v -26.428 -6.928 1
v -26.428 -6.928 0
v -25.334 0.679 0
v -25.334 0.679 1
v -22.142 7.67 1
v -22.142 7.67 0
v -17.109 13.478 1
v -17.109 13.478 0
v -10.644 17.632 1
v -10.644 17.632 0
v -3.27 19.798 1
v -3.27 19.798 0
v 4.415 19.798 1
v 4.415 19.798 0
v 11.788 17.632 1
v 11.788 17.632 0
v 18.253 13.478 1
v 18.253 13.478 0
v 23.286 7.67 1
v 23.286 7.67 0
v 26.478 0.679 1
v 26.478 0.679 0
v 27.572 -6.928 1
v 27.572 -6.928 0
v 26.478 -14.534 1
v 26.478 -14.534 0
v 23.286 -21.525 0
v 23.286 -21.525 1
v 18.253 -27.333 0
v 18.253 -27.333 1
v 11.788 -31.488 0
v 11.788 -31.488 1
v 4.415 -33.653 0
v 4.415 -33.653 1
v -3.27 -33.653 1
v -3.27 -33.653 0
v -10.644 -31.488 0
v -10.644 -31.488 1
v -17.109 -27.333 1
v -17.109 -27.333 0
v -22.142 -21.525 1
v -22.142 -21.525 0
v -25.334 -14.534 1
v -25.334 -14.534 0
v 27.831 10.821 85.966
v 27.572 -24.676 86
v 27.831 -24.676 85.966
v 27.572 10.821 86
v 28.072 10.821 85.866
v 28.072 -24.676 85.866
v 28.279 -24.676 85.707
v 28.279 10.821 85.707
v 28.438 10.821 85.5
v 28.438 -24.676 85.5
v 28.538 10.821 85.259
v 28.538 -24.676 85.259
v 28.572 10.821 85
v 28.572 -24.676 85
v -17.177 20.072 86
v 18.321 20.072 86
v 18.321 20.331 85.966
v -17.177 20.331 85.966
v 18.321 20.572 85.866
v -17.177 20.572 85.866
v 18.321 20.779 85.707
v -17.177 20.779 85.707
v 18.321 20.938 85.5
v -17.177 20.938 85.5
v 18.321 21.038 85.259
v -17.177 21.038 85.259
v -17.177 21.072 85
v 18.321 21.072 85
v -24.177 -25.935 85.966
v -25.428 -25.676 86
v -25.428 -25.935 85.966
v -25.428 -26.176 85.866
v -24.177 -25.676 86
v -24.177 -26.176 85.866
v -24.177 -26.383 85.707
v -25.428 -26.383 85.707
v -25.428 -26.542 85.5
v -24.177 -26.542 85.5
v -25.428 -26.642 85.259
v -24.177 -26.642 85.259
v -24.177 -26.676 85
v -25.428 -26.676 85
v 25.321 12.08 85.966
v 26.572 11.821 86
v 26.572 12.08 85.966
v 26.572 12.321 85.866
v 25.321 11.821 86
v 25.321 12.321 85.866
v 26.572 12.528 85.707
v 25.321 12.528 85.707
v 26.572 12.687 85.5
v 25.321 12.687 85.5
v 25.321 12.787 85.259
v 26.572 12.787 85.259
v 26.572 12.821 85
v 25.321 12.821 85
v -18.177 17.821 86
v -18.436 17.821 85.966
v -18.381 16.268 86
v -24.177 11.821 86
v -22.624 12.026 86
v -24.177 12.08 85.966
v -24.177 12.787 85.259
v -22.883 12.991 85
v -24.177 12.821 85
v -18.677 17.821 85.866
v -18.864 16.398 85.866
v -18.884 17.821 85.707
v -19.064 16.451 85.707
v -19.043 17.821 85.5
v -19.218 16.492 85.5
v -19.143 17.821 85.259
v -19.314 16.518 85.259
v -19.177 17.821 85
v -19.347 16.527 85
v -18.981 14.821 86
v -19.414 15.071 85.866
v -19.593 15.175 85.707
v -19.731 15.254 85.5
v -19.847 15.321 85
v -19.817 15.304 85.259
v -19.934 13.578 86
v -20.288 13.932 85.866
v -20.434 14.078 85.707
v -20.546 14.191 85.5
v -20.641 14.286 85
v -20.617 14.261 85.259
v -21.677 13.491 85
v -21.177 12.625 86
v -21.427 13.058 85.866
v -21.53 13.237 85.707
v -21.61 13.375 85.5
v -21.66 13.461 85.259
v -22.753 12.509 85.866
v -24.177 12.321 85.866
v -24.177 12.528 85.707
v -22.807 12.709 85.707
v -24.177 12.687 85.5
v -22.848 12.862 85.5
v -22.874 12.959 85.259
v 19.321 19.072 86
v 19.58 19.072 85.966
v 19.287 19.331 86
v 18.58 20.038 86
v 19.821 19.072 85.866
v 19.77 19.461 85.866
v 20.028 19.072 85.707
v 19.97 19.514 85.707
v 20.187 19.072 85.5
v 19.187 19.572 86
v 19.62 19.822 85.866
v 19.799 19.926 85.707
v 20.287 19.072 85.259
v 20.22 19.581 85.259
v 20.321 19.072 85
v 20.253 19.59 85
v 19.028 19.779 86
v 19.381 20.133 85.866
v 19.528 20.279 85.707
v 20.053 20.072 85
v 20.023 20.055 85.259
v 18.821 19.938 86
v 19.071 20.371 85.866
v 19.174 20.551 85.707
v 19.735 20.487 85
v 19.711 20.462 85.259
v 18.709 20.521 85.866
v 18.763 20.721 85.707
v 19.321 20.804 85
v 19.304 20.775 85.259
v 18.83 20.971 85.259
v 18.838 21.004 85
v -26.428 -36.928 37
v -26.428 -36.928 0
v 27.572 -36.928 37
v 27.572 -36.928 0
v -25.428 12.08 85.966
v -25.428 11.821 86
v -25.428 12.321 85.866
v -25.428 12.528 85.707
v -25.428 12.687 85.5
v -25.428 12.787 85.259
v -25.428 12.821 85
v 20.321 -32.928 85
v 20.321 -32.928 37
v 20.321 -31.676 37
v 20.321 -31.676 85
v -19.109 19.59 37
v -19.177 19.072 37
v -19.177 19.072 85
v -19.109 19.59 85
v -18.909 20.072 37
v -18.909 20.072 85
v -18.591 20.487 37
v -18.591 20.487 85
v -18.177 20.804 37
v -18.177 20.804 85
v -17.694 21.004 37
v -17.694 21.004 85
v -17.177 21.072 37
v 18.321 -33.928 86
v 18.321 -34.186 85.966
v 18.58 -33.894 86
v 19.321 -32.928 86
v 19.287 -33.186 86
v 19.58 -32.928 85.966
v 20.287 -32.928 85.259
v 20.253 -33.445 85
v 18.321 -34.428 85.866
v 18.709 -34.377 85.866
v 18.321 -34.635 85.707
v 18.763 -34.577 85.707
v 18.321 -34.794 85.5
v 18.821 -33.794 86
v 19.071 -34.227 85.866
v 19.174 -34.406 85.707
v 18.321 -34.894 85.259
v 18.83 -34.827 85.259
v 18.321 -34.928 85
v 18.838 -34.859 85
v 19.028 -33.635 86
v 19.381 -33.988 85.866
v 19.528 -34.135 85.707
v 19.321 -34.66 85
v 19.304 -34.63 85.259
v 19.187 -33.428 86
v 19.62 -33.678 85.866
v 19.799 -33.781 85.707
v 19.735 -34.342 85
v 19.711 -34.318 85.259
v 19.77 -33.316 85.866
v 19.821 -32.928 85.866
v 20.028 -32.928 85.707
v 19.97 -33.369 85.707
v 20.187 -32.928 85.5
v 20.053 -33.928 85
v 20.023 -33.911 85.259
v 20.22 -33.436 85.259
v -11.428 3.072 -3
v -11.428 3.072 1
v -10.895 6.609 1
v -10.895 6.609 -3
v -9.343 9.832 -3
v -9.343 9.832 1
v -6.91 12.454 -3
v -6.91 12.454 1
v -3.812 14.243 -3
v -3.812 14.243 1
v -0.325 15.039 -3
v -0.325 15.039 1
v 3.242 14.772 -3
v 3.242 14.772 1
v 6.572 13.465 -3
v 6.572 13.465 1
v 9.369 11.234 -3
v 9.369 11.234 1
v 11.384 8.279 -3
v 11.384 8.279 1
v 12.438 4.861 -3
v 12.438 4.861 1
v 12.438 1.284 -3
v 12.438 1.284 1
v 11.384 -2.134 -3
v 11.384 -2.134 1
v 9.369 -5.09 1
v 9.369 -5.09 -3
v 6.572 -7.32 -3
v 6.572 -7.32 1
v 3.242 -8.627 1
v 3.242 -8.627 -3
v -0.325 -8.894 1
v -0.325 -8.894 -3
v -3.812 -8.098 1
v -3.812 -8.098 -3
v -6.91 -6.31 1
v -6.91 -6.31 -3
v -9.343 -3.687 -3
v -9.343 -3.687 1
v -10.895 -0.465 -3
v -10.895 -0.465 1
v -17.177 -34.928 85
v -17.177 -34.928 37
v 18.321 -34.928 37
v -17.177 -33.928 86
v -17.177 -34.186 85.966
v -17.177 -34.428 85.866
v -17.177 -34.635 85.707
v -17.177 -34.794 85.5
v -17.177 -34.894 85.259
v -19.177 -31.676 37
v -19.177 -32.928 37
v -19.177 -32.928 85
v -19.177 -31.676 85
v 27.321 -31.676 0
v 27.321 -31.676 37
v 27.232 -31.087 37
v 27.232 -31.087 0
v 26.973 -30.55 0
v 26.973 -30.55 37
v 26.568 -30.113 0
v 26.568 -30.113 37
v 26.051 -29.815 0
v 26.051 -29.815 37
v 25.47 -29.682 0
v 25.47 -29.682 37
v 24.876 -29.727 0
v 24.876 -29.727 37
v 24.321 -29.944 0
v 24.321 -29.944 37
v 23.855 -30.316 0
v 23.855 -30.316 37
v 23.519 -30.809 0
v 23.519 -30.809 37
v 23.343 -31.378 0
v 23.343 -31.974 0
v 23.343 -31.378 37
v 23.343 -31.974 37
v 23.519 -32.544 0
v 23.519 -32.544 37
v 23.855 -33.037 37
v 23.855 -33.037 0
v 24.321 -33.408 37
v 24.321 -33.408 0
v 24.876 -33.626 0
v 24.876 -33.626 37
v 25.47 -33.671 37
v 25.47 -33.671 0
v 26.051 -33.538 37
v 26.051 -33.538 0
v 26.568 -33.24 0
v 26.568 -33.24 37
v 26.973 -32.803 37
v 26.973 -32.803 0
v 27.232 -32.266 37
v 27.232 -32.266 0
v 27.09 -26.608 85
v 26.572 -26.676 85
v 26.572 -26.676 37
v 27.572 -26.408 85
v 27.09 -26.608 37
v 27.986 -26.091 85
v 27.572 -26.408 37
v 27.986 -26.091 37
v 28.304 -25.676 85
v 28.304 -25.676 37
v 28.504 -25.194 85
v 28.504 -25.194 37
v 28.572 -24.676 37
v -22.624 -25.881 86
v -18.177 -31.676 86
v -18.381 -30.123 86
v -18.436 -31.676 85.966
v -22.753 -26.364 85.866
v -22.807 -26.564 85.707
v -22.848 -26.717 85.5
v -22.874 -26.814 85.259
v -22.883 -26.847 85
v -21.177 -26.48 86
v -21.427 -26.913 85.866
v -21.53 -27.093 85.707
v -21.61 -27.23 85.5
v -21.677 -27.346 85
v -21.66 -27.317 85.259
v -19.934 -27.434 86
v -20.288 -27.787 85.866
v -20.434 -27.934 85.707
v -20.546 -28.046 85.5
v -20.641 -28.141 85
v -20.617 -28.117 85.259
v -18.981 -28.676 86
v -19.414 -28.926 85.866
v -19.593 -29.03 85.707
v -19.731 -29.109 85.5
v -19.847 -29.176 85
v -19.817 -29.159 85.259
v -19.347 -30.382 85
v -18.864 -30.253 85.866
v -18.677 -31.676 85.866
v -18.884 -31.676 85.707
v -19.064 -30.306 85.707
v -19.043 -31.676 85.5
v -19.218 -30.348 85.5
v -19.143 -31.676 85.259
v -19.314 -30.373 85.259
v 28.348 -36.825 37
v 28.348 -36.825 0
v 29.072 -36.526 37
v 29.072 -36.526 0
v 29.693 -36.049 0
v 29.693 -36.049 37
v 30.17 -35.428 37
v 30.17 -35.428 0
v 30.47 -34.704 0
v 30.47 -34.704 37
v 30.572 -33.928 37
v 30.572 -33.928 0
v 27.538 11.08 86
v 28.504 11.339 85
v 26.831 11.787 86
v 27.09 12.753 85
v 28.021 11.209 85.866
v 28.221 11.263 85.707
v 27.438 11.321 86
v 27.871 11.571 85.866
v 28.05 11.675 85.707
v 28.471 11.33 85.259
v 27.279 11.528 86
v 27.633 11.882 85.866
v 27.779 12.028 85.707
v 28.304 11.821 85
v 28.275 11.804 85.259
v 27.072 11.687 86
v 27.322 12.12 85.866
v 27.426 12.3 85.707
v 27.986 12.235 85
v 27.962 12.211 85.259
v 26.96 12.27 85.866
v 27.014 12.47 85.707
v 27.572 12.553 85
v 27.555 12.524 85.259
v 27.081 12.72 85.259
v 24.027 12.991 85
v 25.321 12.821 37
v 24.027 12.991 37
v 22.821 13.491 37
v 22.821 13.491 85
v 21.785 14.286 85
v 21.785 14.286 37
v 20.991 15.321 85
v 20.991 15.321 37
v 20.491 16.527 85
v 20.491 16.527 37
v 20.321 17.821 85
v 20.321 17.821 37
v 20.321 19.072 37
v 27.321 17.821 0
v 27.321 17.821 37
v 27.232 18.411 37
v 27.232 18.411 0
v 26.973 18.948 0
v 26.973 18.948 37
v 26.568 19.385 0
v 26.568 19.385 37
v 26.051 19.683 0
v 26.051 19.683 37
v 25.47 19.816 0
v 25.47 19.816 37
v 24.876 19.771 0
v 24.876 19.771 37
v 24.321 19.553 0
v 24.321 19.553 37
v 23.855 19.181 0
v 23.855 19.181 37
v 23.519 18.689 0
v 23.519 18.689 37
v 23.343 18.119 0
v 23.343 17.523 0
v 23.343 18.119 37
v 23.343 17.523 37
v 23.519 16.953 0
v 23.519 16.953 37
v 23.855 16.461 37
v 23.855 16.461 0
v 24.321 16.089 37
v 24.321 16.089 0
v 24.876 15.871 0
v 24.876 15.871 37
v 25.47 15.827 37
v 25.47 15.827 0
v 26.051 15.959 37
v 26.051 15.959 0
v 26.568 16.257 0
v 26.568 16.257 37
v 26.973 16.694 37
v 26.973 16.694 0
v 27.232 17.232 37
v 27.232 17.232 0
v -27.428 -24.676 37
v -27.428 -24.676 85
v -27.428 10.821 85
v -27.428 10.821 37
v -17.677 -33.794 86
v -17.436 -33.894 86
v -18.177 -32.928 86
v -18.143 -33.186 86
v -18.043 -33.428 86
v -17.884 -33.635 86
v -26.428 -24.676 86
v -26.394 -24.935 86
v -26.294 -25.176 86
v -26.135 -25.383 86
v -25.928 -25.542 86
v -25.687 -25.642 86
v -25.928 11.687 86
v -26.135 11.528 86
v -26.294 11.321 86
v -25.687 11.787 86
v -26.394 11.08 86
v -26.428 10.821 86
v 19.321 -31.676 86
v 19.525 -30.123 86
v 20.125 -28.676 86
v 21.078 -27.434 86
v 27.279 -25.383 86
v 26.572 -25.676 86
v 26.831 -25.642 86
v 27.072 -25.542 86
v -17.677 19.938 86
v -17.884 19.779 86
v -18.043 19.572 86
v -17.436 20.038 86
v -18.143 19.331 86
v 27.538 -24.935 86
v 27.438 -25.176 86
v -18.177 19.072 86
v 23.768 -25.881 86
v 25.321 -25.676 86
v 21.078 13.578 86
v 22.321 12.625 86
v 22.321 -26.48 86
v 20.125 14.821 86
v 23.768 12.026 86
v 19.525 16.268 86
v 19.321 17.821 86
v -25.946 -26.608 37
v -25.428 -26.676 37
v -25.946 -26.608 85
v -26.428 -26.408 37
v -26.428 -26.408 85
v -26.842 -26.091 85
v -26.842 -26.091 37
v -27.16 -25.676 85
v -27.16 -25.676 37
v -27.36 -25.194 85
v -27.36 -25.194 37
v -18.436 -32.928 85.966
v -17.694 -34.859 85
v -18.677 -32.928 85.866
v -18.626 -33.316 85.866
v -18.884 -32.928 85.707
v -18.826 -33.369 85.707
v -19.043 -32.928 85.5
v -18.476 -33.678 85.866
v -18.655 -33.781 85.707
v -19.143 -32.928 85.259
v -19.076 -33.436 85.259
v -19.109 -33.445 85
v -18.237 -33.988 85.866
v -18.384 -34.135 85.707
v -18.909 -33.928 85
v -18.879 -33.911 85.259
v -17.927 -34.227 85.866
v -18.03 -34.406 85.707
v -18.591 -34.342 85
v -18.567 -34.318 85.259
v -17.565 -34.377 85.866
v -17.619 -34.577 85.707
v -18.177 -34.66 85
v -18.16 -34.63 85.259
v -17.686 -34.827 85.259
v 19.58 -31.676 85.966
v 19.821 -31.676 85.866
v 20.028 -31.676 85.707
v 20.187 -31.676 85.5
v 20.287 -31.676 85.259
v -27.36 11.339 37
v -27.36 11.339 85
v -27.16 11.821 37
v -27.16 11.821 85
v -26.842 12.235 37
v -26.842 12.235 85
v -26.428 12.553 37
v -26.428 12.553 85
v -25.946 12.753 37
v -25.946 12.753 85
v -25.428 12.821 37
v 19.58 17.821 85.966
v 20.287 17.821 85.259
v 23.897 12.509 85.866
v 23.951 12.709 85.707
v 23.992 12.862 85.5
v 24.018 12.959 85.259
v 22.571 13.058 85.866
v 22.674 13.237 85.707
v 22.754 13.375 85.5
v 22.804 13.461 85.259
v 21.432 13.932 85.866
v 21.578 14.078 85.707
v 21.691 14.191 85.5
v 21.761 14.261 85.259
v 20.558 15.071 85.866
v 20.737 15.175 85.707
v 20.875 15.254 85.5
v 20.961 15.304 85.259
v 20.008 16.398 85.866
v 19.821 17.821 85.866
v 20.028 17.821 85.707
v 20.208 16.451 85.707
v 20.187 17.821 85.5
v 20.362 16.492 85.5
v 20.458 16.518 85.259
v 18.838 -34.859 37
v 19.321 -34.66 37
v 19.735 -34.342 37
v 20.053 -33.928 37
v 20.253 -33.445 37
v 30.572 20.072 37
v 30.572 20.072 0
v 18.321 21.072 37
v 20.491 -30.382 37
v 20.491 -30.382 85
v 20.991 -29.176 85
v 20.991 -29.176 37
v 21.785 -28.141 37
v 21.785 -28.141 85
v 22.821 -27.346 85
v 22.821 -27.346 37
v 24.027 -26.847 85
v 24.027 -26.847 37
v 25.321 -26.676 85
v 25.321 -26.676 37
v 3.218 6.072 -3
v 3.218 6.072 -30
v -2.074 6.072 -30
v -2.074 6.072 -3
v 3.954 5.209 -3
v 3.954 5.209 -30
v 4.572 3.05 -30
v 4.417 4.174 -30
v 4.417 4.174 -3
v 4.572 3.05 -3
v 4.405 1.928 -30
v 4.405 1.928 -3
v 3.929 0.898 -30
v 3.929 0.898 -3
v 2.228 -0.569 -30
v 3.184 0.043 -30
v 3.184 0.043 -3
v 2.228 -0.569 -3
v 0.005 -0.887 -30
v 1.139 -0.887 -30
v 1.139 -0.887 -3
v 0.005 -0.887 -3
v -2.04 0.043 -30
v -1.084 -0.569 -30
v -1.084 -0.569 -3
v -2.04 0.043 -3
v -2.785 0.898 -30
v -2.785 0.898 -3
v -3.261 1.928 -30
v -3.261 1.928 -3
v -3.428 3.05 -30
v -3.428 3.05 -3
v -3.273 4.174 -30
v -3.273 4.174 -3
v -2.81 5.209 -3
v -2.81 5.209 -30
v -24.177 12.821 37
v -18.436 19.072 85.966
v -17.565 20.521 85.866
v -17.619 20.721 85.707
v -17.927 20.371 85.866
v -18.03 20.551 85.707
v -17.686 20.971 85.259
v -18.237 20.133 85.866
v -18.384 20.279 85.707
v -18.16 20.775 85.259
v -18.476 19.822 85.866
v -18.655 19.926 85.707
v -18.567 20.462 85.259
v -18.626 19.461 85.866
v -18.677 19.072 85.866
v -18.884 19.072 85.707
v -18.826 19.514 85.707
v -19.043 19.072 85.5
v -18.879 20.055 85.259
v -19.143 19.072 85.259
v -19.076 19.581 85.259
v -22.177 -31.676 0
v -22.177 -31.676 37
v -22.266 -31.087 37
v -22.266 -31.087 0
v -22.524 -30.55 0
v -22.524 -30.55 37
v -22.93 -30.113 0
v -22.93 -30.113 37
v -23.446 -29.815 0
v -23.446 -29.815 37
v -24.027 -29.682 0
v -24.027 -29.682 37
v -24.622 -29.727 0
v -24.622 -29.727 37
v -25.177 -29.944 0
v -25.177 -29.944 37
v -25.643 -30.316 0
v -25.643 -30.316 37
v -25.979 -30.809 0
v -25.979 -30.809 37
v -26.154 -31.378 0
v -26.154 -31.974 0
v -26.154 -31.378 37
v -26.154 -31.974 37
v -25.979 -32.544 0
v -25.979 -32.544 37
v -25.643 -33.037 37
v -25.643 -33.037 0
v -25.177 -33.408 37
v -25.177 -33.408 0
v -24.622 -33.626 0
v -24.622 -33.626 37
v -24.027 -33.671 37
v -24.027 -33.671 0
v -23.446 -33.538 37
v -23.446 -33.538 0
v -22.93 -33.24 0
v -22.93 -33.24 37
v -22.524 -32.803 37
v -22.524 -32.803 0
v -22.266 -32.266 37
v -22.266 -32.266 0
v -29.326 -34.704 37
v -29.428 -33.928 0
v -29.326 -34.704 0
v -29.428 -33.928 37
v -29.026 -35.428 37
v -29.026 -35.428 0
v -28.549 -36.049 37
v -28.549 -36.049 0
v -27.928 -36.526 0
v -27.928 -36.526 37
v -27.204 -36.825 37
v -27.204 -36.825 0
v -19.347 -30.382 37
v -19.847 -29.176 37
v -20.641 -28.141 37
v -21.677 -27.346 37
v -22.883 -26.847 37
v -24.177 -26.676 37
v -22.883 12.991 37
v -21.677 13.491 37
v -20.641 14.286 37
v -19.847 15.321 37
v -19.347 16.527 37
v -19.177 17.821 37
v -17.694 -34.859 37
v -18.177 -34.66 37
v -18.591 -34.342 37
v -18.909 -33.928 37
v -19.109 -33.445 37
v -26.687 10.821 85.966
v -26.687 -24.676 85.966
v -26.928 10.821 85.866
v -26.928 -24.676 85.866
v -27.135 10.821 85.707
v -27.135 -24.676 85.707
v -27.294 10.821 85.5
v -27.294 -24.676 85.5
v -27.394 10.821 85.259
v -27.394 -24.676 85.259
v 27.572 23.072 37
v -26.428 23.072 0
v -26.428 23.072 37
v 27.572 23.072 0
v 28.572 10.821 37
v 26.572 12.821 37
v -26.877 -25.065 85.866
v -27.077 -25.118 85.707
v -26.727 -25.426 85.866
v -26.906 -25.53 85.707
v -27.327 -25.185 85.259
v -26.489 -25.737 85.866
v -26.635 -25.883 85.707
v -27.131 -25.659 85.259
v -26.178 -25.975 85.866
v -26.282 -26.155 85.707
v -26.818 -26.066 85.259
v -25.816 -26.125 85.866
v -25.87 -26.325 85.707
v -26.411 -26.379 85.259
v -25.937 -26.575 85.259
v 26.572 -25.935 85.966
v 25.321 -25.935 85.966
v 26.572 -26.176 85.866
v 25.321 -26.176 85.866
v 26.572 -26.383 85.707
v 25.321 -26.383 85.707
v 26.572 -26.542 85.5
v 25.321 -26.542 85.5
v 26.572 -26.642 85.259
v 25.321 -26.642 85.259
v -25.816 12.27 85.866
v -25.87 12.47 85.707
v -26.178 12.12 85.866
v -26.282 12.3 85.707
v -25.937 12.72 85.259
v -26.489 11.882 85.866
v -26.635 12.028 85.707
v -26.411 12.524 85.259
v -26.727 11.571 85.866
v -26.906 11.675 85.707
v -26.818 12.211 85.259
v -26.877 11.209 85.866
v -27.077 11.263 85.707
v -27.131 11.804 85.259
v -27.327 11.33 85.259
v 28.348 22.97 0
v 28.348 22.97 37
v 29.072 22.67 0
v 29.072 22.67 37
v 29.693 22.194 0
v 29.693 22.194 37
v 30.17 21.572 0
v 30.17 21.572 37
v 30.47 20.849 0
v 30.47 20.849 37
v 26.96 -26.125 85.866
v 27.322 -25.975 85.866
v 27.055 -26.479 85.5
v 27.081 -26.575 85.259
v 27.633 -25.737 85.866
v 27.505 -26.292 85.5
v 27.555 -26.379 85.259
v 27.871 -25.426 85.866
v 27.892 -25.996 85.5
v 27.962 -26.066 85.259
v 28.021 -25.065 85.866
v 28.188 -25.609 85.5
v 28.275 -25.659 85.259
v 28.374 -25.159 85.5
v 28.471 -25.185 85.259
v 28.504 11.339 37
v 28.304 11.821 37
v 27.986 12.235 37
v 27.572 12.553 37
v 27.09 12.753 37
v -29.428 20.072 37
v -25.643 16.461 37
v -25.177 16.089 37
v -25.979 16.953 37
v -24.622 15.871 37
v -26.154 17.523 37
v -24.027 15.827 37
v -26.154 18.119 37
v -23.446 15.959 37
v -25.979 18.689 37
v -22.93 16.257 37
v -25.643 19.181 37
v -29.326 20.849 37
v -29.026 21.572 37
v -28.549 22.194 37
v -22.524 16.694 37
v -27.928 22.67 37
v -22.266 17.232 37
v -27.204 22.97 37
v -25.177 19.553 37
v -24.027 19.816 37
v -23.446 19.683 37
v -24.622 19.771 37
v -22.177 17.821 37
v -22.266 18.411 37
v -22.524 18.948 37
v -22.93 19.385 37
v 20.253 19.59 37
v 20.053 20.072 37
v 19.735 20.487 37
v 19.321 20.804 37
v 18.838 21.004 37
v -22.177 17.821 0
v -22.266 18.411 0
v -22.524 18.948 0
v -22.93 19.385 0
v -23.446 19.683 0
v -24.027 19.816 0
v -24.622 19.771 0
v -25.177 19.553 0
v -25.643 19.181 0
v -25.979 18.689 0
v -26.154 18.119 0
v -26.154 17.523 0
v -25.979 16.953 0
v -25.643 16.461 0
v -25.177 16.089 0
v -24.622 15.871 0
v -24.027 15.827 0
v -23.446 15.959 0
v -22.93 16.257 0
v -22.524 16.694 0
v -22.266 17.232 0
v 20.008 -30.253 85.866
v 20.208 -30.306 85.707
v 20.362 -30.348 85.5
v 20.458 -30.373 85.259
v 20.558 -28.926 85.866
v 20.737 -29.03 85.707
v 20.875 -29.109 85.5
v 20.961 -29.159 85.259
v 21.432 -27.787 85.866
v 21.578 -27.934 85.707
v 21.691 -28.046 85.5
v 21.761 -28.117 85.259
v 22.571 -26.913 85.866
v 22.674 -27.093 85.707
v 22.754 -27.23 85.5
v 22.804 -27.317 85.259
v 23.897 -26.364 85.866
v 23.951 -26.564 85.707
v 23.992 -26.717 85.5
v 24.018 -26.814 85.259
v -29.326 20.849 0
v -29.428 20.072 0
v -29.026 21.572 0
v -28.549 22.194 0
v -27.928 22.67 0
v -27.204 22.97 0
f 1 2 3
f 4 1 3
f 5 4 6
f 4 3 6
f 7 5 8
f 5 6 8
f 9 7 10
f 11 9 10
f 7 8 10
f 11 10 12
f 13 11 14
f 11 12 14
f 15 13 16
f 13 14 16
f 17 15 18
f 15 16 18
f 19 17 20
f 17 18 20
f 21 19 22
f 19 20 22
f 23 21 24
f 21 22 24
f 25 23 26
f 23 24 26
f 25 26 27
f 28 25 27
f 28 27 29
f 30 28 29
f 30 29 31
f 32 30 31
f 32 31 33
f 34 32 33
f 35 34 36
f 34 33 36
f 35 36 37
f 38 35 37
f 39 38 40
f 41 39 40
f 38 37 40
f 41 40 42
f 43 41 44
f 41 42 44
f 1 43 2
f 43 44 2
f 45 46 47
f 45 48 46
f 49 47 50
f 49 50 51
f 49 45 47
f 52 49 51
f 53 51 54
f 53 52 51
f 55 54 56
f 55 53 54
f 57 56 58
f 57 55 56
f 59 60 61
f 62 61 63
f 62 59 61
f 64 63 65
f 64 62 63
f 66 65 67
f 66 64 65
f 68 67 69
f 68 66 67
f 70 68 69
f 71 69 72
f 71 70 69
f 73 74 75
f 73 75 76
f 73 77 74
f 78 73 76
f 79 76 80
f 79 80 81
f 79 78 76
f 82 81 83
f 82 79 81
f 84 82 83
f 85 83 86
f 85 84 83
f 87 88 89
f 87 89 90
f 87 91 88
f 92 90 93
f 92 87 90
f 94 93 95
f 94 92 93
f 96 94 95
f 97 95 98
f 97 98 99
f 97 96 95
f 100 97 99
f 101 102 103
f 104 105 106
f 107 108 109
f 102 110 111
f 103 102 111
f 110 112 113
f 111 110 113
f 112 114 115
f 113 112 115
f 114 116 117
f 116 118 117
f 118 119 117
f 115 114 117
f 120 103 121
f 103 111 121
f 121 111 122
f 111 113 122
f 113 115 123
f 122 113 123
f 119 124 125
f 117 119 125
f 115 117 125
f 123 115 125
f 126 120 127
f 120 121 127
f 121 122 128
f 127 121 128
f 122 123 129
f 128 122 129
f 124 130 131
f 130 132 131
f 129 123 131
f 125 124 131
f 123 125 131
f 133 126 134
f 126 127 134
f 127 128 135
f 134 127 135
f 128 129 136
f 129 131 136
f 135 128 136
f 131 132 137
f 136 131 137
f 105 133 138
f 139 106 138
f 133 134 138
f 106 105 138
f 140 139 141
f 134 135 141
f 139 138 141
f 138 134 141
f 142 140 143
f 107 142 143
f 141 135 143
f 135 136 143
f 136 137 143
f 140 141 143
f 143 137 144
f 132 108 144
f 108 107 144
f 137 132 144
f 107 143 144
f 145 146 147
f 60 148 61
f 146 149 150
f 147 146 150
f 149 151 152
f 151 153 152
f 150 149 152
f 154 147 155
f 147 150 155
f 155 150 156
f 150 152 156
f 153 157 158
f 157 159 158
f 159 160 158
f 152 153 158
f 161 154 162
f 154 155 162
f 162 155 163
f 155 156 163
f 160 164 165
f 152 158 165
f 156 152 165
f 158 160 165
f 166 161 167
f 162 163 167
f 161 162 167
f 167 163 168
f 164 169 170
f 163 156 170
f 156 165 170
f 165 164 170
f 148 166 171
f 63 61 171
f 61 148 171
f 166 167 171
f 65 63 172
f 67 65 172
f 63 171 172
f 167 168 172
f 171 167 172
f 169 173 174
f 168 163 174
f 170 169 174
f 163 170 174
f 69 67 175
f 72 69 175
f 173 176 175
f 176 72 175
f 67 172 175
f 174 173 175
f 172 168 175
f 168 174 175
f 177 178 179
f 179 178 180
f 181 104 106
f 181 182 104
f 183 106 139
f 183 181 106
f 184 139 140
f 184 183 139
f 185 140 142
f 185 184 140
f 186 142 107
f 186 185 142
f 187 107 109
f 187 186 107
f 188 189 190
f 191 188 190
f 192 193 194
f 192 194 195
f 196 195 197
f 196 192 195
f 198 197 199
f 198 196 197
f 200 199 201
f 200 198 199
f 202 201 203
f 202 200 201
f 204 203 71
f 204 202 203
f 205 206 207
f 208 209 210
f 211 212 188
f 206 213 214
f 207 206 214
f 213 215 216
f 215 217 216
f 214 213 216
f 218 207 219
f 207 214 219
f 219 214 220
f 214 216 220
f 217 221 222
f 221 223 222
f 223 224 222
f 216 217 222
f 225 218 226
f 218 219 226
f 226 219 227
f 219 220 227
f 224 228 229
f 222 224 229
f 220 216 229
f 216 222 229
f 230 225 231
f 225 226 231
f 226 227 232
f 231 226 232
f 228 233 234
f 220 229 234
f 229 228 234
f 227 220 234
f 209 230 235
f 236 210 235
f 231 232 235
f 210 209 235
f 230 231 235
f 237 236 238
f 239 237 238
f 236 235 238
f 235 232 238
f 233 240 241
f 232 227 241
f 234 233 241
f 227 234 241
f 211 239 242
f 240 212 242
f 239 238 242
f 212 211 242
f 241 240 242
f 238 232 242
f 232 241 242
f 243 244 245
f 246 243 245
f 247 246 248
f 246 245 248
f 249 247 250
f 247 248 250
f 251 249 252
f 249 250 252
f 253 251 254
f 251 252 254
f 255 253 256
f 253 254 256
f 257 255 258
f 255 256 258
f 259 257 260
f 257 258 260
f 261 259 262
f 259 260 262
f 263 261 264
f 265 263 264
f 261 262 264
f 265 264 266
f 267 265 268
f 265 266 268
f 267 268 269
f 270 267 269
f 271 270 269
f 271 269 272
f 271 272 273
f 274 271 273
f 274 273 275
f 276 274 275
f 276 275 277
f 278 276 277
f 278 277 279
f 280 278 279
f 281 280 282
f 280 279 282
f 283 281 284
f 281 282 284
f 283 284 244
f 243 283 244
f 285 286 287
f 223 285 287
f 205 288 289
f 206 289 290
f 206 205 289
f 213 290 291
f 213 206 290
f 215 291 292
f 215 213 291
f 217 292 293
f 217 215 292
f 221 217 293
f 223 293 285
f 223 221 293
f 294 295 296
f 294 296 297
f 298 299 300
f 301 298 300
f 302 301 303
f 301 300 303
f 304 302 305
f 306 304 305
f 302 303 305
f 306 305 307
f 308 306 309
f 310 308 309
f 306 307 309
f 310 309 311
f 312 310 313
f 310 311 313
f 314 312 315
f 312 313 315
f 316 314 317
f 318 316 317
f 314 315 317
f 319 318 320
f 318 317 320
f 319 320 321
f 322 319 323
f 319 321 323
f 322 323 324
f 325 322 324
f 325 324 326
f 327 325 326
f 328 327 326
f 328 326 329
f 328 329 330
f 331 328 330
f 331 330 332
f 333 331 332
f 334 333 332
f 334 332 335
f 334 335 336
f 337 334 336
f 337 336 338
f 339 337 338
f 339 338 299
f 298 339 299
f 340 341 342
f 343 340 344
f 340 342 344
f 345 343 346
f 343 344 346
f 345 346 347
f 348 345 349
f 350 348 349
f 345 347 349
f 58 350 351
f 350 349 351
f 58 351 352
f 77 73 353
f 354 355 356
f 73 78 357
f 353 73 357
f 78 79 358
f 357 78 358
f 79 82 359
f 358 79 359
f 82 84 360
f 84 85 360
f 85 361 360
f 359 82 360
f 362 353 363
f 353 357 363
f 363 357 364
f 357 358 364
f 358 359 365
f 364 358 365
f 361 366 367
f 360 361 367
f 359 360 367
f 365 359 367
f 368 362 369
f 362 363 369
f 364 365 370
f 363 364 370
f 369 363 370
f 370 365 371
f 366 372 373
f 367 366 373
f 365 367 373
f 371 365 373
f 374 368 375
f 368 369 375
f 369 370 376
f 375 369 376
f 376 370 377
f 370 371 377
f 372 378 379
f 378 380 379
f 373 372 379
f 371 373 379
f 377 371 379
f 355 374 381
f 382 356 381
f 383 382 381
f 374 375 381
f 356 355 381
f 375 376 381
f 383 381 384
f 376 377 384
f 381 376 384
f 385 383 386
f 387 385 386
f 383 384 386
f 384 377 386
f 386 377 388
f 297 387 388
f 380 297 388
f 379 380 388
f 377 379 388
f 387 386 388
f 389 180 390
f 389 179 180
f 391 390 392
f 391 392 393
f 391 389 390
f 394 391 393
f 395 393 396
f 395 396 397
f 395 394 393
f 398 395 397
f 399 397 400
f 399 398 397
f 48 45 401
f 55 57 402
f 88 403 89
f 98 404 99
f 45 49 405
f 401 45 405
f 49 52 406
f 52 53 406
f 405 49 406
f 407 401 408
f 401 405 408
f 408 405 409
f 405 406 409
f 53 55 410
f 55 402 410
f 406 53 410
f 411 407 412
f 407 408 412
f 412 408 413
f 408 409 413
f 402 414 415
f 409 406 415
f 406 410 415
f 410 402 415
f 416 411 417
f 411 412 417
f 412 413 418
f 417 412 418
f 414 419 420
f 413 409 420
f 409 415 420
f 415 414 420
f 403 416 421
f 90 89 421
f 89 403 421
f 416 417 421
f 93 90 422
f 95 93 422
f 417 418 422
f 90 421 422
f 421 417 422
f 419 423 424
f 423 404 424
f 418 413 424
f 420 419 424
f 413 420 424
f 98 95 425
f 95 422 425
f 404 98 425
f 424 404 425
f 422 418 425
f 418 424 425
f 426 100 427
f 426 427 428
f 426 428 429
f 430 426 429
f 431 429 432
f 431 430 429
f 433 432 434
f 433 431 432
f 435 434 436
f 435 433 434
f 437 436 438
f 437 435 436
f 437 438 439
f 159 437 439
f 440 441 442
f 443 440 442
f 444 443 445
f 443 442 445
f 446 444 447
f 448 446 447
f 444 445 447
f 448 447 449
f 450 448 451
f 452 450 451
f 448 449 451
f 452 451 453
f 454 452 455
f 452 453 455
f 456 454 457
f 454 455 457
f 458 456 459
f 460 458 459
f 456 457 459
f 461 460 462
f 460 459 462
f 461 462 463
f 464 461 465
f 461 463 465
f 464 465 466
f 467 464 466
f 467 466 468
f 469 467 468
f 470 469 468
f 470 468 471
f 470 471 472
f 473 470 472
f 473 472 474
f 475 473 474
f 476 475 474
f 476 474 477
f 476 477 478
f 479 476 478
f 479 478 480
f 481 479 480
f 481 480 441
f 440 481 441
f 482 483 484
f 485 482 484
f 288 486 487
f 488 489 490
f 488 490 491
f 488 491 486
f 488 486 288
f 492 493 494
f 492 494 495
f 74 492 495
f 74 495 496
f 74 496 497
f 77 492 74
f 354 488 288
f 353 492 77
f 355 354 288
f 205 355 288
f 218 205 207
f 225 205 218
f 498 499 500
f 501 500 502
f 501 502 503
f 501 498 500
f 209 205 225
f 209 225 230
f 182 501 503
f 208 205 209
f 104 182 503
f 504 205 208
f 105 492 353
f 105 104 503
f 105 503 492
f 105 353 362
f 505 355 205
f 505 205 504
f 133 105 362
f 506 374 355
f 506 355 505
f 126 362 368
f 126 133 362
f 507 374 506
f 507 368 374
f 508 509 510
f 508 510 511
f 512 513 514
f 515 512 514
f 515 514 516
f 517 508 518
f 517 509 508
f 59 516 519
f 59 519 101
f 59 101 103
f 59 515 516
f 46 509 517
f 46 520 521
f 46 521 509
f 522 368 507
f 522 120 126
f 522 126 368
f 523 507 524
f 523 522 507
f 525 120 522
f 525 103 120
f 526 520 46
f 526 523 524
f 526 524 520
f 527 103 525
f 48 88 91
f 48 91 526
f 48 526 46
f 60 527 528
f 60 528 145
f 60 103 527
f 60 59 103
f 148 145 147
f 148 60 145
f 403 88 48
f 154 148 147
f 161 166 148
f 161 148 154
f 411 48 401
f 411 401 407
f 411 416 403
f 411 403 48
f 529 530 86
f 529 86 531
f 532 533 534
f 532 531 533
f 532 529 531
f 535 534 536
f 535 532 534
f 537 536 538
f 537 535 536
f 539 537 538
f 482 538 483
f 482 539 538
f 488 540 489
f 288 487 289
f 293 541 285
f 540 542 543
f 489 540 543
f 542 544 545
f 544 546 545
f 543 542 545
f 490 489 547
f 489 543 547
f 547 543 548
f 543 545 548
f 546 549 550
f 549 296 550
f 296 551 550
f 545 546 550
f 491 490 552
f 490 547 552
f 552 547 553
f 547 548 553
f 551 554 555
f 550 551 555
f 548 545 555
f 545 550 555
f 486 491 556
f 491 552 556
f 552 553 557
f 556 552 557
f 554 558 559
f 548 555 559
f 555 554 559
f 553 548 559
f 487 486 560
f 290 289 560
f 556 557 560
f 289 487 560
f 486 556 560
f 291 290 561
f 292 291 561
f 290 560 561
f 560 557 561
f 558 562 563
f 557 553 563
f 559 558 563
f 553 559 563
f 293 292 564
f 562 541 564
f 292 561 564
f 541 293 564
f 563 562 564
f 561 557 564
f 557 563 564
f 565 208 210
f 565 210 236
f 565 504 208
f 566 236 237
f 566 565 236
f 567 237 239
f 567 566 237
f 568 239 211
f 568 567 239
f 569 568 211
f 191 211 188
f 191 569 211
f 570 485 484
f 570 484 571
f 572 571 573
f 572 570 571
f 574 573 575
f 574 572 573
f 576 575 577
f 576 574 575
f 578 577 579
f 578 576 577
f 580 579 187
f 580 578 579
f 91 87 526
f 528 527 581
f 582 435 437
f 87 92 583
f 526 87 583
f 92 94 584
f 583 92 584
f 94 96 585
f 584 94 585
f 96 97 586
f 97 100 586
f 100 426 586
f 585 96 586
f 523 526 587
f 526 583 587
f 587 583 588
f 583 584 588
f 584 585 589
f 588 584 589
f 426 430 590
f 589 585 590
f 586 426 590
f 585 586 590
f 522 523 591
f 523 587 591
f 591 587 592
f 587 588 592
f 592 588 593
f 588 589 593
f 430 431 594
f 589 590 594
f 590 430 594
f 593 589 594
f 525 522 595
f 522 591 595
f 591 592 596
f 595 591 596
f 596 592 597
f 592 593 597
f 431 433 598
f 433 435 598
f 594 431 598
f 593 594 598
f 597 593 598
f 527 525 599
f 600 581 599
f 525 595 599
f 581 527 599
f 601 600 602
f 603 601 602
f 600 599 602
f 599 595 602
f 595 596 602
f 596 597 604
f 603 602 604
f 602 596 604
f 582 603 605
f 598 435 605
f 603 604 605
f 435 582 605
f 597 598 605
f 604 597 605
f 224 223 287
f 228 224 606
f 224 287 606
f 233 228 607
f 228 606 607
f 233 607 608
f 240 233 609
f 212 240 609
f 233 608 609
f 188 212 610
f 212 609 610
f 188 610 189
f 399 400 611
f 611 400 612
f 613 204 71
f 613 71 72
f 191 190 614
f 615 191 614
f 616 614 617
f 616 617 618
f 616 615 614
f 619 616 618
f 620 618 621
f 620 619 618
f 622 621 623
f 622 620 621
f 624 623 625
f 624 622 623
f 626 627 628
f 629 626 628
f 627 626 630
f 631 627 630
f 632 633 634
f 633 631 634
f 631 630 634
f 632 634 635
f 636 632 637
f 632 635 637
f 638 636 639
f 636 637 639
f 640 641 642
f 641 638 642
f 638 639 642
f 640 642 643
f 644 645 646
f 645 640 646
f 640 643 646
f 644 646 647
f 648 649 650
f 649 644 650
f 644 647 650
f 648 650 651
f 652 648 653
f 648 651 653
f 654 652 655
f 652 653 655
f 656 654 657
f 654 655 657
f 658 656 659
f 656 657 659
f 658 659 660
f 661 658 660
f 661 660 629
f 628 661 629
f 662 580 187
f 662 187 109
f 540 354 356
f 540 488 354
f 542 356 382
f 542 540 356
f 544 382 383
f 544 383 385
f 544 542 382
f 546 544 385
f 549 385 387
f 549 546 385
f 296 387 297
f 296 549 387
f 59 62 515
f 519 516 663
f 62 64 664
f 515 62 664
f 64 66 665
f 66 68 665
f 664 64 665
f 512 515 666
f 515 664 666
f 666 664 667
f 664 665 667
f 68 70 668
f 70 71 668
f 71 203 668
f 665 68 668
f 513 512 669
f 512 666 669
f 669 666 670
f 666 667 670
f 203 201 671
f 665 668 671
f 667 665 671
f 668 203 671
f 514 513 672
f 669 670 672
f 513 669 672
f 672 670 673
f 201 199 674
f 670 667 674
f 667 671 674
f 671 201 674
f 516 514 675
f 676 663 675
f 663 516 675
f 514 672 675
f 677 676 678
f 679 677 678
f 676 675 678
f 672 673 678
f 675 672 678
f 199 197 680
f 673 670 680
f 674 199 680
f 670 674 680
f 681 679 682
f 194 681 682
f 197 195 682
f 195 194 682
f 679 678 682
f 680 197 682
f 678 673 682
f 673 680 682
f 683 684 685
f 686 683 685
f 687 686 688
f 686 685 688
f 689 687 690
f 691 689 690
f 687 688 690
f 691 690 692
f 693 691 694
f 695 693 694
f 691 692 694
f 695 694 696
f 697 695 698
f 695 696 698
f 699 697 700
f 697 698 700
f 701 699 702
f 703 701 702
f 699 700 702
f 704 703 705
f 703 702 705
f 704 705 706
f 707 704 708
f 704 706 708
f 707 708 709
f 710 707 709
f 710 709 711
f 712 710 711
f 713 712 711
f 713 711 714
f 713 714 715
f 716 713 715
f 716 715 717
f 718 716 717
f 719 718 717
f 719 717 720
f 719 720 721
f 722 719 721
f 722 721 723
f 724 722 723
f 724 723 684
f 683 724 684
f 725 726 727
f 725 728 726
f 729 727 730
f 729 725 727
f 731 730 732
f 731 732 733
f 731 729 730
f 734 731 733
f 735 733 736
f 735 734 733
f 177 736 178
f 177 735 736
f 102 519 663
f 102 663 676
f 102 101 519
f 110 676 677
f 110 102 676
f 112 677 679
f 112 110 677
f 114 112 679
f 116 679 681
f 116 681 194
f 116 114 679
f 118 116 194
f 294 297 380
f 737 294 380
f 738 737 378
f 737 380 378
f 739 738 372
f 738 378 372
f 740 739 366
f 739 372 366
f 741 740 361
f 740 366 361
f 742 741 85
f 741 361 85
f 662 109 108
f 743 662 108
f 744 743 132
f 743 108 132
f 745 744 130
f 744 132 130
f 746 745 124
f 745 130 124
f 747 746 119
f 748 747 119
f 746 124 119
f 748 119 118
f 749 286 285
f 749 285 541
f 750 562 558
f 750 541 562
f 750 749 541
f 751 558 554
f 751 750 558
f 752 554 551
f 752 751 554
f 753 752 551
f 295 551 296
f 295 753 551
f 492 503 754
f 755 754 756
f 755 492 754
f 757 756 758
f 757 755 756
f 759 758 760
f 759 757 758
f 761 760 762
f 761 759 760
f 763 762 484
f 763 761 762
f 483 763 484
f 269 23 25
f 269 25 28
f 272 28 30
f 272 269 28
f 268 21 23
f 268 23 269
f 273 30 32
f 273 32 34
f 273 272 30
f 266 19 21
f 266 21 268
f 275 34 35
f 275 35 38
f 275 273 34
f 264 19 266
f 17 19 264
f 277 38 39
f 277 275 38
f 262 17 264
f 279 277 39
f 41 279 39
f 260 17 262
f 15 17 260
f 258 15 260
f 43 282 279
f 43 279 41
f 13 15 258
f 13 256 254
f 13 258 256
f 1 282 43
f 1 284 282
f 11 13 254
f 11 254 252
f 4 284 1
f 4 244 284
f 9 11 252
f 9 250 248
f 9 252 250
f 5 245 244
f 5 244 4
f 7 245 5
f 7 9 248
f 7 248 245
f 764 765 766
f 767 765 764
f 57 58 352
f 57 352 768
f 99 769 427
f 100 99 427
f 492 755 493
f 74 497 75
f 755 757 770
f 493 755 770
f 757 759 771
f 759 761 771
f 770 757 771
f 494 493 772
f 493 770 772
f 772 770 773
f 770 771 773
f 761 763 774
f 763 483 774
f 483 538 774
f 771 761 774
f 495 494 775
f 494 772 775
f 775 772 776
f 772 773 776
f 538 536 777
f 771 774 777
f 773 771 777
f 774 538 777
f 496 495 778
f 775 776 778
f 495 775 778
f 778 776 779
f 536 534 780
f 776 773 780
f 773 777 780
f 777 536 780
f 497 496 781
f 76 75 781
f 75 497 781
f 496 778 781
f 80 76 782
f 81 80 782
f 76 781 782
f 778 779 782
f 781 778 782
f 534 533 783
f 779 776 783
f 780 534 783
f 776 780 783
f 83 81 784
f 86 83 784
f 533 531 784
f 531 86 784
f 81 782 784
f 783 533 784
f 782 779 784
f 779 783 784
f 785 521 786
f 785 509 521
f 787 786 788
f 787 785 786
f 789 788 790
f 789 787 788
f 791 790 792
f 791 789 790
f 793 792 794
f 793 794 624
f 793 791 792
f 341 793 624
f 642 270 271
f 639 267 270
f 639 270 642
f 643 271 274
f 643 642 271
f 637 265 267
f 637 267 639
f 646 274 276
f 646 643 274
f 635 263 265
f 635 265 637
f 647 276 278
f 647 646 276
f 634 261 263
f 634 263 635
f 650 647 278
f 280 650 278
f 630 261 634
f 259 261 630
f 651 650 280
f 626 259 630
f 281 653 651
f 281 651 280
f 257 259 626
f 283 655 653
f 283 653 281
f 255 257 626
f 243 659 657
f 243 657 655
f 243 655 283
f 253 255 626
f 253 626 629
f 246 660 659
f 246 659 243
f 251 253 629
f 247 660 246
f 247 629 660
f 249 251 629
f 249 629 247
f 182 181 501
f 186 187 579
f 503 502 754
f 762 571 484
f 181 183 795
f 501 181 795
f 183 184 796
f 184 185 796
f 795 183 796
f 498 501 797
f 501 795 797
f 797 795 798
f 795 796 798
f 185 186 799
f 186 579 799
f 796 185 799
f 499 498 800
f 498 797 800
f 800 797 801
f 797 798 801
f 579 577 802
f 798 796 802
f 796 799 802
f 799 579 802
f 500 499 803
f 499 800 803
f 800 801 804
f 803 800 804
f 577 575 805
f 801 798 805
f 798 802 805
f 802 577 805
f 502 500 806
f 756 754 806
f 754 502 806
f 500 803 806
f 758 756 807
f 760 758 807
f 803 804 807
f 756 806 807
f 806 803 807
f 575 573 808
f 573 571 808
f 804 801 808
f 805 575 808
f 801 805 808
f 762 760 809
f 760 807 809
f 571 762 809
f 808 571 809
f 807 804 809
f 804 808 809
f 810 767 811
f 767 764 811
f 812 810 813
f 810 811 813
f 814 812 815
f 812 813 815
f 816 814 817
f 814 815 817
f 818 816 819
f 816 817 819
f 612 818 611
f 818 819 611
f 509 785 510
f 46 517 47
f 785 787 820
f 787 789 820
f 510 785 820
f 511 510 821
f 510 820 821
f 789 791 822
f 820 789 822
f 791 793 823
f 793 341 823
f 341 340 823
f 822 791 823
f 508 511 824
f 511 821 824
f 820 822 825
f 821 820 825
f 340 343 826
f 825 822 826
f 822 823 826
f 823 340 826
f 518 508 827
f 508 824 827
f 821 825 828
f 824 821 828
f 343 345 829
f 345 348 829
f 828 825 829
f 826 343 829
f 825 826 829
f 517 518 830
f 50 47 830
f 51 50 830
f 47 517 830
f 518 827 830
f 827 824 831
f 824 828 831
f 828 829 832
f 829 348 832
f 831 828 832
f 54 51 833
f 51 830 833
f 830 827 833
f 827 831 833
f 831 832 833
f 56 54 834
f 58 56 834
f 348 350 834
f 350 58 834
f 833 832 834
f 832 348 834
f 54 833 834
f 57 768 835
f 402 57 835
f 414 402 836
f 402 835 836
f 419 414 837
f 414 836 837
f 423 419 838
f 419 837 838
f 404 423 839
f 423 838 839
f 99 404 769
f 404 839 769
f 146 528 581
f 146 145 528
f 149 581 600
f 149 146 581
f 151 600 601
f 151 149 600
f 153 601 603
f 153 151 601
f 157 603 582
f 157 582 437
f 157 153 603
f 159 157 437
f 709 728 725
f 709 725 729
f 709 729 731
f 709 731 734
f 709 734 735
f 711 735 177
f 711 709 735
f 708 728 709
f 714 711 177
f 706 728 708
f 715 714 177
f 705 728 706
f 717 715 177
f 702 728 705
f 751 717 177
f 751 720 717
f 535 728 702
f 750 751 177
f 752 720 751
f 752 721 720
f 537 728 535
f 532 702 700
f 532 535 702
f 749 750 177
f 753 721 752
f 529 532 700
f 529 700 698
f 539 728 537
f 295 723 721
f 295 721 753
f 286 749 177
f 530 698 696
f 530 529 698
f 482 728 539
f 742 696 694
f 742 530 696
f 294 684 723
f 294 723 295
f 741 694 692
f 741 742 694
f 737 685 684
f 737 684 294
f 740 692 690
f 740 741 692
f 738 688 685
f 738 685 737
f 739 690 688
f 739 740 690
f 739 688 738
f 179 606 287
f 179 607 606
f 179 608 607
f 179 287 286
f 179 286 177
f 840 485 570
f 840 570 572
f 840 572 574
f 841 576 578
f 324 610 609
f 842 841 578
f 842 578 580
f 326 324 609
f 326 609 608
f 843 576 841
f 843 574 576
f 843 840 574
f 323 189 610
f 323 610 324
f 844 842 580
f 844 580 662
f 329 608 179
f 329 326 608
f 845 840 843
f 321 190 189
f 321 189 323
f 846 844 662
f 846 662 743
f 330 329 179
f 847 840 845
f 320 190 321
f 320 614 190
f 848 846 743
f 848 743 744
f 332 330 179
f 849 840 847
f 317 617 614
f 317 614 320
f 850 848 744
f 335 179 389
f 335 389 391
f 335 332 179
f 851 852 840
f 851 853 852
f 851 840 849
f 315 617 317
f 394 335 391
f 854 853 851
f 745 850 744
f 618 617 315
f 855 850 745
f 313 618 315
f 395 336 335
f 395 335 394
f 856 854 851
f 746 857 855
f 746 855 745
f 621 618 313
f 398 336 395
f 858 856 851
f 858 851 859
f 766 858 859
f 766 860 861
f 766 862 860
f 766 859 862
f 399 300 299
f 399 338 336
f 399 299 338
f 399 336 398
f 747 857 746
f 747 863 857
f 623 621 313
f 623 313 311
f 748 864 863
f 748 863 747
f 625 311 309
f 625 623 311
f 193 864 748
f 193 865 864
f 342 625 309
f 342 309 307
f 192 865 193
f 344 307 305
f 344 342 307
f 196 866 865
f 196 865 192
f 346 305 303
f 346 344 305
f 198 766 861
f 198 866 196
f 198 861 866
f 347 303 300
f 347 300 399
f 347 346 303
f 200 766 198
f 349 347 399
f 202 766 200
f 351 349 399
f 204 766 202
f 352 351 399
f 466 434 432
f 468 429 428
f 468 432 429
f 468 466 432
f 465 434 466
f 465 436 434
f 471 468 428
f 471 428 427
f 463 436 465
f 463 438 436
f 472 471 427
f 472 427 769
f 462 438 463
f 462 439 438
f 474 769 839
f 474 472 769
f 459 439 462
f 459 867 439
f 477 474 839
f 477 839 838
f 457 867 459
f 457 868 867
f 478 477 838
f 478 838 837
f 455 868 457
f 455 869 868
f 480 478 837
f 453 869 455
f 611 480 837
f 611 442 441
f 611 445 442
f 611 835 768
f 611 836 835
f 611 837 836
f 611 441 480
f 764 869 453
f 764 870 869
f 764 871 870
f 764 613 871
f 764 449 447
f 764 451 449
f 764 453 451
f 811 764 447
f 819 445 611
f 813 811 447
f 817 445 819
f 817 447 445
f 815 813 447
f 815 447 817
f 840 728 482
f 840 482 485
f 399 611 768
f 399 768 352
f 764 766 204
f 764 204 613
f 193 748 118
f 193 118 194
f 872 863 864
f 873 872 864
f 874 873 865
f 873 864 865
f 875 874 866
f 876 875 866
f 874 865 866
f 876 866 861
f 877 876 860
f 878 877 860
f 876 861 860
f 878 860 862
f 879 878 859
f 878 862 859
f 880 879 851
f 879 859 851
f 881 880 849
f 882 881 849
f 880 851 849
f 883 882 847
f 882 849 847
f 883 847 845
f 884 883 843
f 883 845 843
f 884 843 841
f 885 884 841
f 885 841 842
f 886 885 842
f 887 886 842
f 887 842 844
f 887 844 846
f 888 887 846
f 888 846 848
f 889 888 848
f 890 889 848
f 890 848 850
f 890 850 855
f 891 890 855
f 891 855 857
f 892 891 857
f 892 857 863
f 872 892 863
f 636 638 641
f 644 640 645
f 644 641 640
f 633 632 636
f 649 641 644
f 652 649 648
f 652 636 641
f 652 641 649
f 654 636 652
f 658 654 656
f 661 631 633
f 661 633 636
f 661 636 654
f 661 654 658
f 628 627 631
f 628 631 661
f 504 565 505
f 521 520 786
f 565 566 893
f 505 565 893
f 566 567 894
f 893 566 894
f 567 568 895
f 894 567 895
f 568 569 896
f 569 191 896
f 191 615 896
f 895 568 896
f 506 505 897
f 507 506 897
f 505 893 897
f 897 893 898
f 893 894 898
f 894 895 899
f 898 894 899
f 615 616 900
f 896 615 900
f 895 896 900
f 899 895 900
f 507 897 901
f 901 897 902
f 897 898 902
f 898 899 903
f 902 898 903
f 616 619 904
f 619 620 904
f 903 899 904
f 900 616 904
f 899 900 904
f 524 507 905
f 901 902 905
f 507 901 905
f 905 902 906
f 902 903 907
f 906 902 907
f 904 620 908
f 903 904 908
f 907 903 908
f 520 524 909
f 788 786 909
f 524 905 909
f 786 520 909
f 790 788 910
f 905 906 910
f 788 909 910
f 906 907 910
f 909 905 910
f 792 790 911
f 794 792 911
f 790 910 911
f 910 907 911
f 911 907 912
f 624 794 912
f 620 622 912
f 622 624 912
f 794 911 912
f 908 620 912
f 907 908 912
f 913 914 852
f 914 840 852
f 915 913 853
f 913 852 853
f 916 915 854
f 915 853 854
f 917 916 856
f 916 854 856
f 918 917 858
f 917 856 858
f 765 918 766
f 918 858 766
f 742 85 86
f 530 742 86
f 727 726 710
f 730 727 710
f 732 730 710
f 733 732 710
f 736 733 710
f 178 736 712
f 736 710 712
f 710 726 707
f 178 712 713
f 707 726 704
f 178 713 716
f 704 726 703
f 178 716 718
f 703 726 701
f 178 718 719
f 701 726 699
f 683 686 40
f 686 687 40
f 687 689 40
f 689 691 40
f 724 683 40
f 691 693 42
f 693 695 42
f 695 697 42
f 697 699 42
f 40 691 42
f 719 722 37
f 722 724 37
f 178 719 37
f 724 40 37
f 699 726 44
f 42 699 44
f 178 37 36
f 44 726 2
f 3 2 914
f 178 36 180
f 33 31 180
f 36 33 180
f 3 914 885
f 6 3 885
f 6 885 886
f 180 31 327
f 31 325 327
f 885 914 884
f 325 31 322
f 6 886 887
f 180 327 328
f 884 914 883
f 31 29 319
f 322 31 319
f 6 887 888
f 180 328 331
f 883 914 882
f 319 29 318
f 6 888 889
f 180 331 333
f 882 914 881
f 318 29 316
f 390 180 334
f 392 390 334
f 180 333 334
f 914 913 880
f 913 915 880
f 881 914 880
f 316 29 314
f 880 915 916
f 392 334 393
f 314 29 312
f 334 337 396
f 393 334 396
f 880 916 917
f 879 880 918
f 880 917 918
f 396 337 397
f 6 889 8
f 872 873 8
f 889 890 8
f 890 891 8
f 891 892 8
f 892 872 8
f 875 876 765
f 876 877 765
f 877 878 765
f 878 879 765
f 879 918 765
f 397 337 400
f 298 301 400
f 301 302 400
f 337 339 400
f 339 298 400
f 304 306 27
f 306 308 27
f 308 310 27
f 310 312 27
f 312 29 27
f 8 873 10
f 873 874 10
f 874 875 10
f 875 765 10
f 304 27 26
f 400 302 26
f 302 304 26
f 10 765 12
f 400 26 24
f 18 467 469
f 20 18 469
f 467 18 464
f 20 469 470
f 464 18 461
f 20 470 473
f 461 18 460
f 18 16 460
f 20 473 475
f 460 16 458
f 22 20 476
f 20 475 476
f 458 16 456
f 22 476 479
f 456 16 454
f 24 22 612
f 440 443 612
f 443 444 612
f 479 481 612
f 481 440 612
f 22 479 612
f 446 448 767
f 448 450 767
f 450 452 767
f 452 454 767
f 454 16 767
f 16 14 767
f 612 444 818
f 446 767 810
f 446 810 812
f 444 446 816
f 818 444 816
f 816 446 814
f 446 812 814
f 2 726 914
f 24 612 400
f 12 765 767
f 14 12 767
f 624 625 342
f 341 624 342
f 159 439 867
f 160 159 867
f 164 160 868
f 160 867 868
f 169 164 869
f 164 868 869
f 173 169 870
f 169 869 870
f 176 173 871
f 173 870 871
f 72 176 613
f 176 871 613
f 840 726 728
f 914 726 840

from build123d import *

# Parameters (mm, degrees)
SKETCH_1_W          = 60
SKETCH_1_H          = 60
EXTRUDE_1_DEPTH     = 37
SKETCH_2_W          = 56
SKETCH_2_H          = 56
EXTRUDE_2_DEPTH     = 49
CUT_EXTRUDE_1_DEPTH = 49
SKETCH_4_R          = 2
CUT_EXTRUDE_2_DEPTH = 49
FILLET_1_R          = 2
SKETCH_5_R          = 27
CUT_EXTRUDE_3_DEPTH = 1
SKETCH_6_R          = 12
EXTRUDE_3_DEPTH     = 4
SKETCH_7_R          = 4
EXTRUDE_4_DEPTH     = 27
SKETCH_8_W          = 5.291502622
SKETCH_8_H          = 3.956308335
CUT_EXTRUDE_4_DEPTH = 27
FILLET_2_R          = 1
FILLET_3_R          = 3


with BuildPart() as part:
    # Эскиз1 → Бобышка-Вытянуть1 (new body)
    with BuildSketch(Plane.XY):
        with Locations((0.572032188, -6.927630122)):
            Rectangle(SKETCH_1_W, SKETCH_1_H)
    extrude(amount=EXTRUDE_1_DEPTH)

    # Эскиз2 → Бобышка-Вытянуть2 (add)
    with BuildSketch(Plane.XY.offset(37)):
        with Locations((0.572032188, -6.927630122)):
            Rectangle(SKETCH_2_W, SKETCH_2_H)
    extrude(amount=EXTRUDE_2_DEPTH)

    # Эскиз3 → Вырез-Вытянуть1 (cut)
    with BuildSketch(Plane.XY.offset(86)):
        with BuildLine():
            Line((-19.176705154, 17.82110722), (-19.176705154, 21.072369878))
            Line((-19.176705154, 21.072369878), (-27.427967812, 21.072369878))
            Line((-27.427967812, 21.072369878), (-27.427967812, 12.82110722))
            Line((-27.427967812, 12.82110722), (-24.176705154, 12.82110722))
            ThreePointArc((-24.176705154, 12.82110722), (-20.641171248, 14.285573314), (-19.176705154, 17.82110722))
        make_face()
        with BuildLine():
            Line((20.32076953, 17.82110722), (20.32076953, 21.072369878))
            Line((20.32076953, 21.072369878), (28.572032188, 21.072369878))
            Line((28.572032188, 21.072369878), (28.572032188, 12.82110722))
            Line((28.572032188, 12.82110722), (25.32076953, 12.82110722))
            ThreePointArc((25.32076953, 12.82110722), (21.785235624, 14.285573314), (20.32076953, 17.82110722))
        make_face()
        with BuildLine():
            Line((-24.176705154, -26.676367463), (-27.427967812, -26.676367463))
            Line((-27.427967812, -26.676367463), (-27.427967812, -34.927630122))
            Line((-27.427967812, -34.927630122), (-19.176705154, -34.927630122))
            Line((-19.176705154, -34.927630122), (-19.176705154, -31.676367463))
            ThreePointArc((-19.176705154, -31.676367463), (-20.641171248, -28.140833557), (-24.176705154, -26.676367463))
        make_face()
        with BuildLine():
            Line((25.32076953, -26.676367463), (28.572032188, -26.676367463))
            Line((28.572032188, -26.676367463), (28.572032188, -34.927630122))
            Line((28.572032188, -34.927630122), (20.32076953, -34.927630122))
            Line((20.32076953, -34.927630122), (20.32076953, -31.676367463))
            ThreePointArc((20.32076953, -31.676367463), (21.785235624, -28.140833557), (25.32076953, -26.676367463))
        make_face()
    extrude(amount=-CUT_EXTRUDE_1_DEPTH, mode=Mode.SUBTRACT)

    # Эскиз4 → Вырез-Вытянуть2 (cut)
    with BuildSketch(Plane.XY.offset(37)):
        with Locations((-24.176705154, 17.82110722)):
            Circle(SKETCH_4_R)
        with Locations((25.32076953, 17.82110722)):
            Circle(SKETCH_4_R)
        with Locations((-24.176705154, -31.676367463)):
            Circle(SKETCH_4_R)
        with Locations((25.32076953, -31.676367463)):
            Circle(SKETCH_4_R)
    extrude(amount=-CUT_EXTRUDE_2_DEPTH, mode=Mode.SUBTRACT)

    # Скругление1
    fillet_1_edges = [part.edges().sort_by_distance(p)[0] for p in [
        (-19.176705154, 21.072369878, 61.5),
        (-27.427967812, 12.82110722, 61.5),
        (28.572032188, 12.82110722, 61.5),
        (20.32076953, 21.072369878, 61.5),
        (-19.176705154, -34.927630122, 61.5),
        (-27.427967812, -26.676367463, 61.5),
        (28.572032188, -26.676367463, 61.5),
        (20.32076953, -34.927630122, 61.5),
    ]]
    fillet(fillet_1_edges, radius=FILLET_1_R)

    # Эскиз5 → Вырез-Вытянуть3 (cut)
    with BuildSketch(Plane(origin=(0, 0, 0), x_dir=(-1, 0, 0), z_dir=(0, 0, -1))):
        with Locations((-0.572032188, -6.927630122)):
            Circle(SKETCH_5_R)
    extrude(amount=-CUT_EXTRUDE_3_DEPTH, mode=Mode.SUBTRACT)

    # Эскиз6 → Бобышка-Вытянуть3 (add)
    with BuildSketch(Plane(origin=(0, 0, 1), x_dir=(-1, 0, 0), z_dir=(0, 0, -1))):
        with Locations((-0.572032188, 3.072369878)):
            Circle(SKETCH_6_R)
    extrude(amount=EXTRUDE_3_DEPTH)

    # Эскиз7 → Бобышка-Вытянуть4 (add)
    with BuildSketch(Plane(origin=(0, 0, -3), x_dir=(-1, 0, 0), z_dir=(0, 0, -1))):
        with Locations((-0.572032188, 3.072369878)):
            Circle(SKETCH_7_R)
    extrude(amount=EXTRUDE_4_DEPTH)

    # Эскиз8 → Вырез-Вытянуть4 (cut)
    with BuildSketch(Plane(origin=(0, 0, -30), x_dir=(-1, 0, 0), z_dir=(0, 0, -1))):
        with Locations((-0.572032188, 8.050524046)):
            Rectangle(SKETCH_8_W, SKETCH_8_H)
    extrude(amount=-CUT_EXTRUDE_4_DEPTH, mode=Mode.SUBTRACT)

    # Скругление2
    fillet_2_edges = [part.edges().sort_by_distance(p)[0] for p in [
        (28.572032188, -6.927630122, 86),
        (25.946400859, -26.676367463, 86),
        (20.32076953, 18.446738549, 86),
        (0.572032188, 21.072369878, 86),
        (-24.802336483, 12.82110722, 86),
        (-27.427967812, -6.927630122, 86),
        (-19.176705154, -32.301998793, 86),
        (0.572032188, -34.927630122, 86),
        (-26.842181374, 12.235320782, 86),
        (-18.590918716, 20.486583441, 86),
        (-26.842181374, -26.090581026, 86),
        (-18.590918716, -34.341843684, 86),
        (19.734983092, -34.341843684, 86),
        (27.98624575, -26.090581026, 86),
        (19.734983092, 20.486583441, 86),
        (27.98624575, 12.235320782, 86),
        (-20.641171248, 14.285573314, 86),
        (-19.176705154, 18.446738549, 86),
        (21.785235624, 14.285573314, 86),
        (25.946400859, 12.82110722, 86),
        (-20.641171248, -28.140833557, 86),
        (-24.802336483, -26.676367463, 86),
        (21.785235624, -28.140833557, 86),
        (20.32076953, -32.301998793, 86),
    ]]
    fillet(fillet_2_edges, radius=FILLET_2_R)

    # Скругление3
    fillet_3_edges = [part.edges().sort_by_distance(p)[0] for p in [
        (-29.427967812, 23.072369878, 18.5),
        (30.572032188, 23.072369878, 18.5),
        (30.572032188, -36.927630122, 18.5),
        (-29.427967812, -36.927630122, 18.5),
    ]]
    fillet(fillet_3_edges, radius=FILLET_3_R)


solid = part.part
